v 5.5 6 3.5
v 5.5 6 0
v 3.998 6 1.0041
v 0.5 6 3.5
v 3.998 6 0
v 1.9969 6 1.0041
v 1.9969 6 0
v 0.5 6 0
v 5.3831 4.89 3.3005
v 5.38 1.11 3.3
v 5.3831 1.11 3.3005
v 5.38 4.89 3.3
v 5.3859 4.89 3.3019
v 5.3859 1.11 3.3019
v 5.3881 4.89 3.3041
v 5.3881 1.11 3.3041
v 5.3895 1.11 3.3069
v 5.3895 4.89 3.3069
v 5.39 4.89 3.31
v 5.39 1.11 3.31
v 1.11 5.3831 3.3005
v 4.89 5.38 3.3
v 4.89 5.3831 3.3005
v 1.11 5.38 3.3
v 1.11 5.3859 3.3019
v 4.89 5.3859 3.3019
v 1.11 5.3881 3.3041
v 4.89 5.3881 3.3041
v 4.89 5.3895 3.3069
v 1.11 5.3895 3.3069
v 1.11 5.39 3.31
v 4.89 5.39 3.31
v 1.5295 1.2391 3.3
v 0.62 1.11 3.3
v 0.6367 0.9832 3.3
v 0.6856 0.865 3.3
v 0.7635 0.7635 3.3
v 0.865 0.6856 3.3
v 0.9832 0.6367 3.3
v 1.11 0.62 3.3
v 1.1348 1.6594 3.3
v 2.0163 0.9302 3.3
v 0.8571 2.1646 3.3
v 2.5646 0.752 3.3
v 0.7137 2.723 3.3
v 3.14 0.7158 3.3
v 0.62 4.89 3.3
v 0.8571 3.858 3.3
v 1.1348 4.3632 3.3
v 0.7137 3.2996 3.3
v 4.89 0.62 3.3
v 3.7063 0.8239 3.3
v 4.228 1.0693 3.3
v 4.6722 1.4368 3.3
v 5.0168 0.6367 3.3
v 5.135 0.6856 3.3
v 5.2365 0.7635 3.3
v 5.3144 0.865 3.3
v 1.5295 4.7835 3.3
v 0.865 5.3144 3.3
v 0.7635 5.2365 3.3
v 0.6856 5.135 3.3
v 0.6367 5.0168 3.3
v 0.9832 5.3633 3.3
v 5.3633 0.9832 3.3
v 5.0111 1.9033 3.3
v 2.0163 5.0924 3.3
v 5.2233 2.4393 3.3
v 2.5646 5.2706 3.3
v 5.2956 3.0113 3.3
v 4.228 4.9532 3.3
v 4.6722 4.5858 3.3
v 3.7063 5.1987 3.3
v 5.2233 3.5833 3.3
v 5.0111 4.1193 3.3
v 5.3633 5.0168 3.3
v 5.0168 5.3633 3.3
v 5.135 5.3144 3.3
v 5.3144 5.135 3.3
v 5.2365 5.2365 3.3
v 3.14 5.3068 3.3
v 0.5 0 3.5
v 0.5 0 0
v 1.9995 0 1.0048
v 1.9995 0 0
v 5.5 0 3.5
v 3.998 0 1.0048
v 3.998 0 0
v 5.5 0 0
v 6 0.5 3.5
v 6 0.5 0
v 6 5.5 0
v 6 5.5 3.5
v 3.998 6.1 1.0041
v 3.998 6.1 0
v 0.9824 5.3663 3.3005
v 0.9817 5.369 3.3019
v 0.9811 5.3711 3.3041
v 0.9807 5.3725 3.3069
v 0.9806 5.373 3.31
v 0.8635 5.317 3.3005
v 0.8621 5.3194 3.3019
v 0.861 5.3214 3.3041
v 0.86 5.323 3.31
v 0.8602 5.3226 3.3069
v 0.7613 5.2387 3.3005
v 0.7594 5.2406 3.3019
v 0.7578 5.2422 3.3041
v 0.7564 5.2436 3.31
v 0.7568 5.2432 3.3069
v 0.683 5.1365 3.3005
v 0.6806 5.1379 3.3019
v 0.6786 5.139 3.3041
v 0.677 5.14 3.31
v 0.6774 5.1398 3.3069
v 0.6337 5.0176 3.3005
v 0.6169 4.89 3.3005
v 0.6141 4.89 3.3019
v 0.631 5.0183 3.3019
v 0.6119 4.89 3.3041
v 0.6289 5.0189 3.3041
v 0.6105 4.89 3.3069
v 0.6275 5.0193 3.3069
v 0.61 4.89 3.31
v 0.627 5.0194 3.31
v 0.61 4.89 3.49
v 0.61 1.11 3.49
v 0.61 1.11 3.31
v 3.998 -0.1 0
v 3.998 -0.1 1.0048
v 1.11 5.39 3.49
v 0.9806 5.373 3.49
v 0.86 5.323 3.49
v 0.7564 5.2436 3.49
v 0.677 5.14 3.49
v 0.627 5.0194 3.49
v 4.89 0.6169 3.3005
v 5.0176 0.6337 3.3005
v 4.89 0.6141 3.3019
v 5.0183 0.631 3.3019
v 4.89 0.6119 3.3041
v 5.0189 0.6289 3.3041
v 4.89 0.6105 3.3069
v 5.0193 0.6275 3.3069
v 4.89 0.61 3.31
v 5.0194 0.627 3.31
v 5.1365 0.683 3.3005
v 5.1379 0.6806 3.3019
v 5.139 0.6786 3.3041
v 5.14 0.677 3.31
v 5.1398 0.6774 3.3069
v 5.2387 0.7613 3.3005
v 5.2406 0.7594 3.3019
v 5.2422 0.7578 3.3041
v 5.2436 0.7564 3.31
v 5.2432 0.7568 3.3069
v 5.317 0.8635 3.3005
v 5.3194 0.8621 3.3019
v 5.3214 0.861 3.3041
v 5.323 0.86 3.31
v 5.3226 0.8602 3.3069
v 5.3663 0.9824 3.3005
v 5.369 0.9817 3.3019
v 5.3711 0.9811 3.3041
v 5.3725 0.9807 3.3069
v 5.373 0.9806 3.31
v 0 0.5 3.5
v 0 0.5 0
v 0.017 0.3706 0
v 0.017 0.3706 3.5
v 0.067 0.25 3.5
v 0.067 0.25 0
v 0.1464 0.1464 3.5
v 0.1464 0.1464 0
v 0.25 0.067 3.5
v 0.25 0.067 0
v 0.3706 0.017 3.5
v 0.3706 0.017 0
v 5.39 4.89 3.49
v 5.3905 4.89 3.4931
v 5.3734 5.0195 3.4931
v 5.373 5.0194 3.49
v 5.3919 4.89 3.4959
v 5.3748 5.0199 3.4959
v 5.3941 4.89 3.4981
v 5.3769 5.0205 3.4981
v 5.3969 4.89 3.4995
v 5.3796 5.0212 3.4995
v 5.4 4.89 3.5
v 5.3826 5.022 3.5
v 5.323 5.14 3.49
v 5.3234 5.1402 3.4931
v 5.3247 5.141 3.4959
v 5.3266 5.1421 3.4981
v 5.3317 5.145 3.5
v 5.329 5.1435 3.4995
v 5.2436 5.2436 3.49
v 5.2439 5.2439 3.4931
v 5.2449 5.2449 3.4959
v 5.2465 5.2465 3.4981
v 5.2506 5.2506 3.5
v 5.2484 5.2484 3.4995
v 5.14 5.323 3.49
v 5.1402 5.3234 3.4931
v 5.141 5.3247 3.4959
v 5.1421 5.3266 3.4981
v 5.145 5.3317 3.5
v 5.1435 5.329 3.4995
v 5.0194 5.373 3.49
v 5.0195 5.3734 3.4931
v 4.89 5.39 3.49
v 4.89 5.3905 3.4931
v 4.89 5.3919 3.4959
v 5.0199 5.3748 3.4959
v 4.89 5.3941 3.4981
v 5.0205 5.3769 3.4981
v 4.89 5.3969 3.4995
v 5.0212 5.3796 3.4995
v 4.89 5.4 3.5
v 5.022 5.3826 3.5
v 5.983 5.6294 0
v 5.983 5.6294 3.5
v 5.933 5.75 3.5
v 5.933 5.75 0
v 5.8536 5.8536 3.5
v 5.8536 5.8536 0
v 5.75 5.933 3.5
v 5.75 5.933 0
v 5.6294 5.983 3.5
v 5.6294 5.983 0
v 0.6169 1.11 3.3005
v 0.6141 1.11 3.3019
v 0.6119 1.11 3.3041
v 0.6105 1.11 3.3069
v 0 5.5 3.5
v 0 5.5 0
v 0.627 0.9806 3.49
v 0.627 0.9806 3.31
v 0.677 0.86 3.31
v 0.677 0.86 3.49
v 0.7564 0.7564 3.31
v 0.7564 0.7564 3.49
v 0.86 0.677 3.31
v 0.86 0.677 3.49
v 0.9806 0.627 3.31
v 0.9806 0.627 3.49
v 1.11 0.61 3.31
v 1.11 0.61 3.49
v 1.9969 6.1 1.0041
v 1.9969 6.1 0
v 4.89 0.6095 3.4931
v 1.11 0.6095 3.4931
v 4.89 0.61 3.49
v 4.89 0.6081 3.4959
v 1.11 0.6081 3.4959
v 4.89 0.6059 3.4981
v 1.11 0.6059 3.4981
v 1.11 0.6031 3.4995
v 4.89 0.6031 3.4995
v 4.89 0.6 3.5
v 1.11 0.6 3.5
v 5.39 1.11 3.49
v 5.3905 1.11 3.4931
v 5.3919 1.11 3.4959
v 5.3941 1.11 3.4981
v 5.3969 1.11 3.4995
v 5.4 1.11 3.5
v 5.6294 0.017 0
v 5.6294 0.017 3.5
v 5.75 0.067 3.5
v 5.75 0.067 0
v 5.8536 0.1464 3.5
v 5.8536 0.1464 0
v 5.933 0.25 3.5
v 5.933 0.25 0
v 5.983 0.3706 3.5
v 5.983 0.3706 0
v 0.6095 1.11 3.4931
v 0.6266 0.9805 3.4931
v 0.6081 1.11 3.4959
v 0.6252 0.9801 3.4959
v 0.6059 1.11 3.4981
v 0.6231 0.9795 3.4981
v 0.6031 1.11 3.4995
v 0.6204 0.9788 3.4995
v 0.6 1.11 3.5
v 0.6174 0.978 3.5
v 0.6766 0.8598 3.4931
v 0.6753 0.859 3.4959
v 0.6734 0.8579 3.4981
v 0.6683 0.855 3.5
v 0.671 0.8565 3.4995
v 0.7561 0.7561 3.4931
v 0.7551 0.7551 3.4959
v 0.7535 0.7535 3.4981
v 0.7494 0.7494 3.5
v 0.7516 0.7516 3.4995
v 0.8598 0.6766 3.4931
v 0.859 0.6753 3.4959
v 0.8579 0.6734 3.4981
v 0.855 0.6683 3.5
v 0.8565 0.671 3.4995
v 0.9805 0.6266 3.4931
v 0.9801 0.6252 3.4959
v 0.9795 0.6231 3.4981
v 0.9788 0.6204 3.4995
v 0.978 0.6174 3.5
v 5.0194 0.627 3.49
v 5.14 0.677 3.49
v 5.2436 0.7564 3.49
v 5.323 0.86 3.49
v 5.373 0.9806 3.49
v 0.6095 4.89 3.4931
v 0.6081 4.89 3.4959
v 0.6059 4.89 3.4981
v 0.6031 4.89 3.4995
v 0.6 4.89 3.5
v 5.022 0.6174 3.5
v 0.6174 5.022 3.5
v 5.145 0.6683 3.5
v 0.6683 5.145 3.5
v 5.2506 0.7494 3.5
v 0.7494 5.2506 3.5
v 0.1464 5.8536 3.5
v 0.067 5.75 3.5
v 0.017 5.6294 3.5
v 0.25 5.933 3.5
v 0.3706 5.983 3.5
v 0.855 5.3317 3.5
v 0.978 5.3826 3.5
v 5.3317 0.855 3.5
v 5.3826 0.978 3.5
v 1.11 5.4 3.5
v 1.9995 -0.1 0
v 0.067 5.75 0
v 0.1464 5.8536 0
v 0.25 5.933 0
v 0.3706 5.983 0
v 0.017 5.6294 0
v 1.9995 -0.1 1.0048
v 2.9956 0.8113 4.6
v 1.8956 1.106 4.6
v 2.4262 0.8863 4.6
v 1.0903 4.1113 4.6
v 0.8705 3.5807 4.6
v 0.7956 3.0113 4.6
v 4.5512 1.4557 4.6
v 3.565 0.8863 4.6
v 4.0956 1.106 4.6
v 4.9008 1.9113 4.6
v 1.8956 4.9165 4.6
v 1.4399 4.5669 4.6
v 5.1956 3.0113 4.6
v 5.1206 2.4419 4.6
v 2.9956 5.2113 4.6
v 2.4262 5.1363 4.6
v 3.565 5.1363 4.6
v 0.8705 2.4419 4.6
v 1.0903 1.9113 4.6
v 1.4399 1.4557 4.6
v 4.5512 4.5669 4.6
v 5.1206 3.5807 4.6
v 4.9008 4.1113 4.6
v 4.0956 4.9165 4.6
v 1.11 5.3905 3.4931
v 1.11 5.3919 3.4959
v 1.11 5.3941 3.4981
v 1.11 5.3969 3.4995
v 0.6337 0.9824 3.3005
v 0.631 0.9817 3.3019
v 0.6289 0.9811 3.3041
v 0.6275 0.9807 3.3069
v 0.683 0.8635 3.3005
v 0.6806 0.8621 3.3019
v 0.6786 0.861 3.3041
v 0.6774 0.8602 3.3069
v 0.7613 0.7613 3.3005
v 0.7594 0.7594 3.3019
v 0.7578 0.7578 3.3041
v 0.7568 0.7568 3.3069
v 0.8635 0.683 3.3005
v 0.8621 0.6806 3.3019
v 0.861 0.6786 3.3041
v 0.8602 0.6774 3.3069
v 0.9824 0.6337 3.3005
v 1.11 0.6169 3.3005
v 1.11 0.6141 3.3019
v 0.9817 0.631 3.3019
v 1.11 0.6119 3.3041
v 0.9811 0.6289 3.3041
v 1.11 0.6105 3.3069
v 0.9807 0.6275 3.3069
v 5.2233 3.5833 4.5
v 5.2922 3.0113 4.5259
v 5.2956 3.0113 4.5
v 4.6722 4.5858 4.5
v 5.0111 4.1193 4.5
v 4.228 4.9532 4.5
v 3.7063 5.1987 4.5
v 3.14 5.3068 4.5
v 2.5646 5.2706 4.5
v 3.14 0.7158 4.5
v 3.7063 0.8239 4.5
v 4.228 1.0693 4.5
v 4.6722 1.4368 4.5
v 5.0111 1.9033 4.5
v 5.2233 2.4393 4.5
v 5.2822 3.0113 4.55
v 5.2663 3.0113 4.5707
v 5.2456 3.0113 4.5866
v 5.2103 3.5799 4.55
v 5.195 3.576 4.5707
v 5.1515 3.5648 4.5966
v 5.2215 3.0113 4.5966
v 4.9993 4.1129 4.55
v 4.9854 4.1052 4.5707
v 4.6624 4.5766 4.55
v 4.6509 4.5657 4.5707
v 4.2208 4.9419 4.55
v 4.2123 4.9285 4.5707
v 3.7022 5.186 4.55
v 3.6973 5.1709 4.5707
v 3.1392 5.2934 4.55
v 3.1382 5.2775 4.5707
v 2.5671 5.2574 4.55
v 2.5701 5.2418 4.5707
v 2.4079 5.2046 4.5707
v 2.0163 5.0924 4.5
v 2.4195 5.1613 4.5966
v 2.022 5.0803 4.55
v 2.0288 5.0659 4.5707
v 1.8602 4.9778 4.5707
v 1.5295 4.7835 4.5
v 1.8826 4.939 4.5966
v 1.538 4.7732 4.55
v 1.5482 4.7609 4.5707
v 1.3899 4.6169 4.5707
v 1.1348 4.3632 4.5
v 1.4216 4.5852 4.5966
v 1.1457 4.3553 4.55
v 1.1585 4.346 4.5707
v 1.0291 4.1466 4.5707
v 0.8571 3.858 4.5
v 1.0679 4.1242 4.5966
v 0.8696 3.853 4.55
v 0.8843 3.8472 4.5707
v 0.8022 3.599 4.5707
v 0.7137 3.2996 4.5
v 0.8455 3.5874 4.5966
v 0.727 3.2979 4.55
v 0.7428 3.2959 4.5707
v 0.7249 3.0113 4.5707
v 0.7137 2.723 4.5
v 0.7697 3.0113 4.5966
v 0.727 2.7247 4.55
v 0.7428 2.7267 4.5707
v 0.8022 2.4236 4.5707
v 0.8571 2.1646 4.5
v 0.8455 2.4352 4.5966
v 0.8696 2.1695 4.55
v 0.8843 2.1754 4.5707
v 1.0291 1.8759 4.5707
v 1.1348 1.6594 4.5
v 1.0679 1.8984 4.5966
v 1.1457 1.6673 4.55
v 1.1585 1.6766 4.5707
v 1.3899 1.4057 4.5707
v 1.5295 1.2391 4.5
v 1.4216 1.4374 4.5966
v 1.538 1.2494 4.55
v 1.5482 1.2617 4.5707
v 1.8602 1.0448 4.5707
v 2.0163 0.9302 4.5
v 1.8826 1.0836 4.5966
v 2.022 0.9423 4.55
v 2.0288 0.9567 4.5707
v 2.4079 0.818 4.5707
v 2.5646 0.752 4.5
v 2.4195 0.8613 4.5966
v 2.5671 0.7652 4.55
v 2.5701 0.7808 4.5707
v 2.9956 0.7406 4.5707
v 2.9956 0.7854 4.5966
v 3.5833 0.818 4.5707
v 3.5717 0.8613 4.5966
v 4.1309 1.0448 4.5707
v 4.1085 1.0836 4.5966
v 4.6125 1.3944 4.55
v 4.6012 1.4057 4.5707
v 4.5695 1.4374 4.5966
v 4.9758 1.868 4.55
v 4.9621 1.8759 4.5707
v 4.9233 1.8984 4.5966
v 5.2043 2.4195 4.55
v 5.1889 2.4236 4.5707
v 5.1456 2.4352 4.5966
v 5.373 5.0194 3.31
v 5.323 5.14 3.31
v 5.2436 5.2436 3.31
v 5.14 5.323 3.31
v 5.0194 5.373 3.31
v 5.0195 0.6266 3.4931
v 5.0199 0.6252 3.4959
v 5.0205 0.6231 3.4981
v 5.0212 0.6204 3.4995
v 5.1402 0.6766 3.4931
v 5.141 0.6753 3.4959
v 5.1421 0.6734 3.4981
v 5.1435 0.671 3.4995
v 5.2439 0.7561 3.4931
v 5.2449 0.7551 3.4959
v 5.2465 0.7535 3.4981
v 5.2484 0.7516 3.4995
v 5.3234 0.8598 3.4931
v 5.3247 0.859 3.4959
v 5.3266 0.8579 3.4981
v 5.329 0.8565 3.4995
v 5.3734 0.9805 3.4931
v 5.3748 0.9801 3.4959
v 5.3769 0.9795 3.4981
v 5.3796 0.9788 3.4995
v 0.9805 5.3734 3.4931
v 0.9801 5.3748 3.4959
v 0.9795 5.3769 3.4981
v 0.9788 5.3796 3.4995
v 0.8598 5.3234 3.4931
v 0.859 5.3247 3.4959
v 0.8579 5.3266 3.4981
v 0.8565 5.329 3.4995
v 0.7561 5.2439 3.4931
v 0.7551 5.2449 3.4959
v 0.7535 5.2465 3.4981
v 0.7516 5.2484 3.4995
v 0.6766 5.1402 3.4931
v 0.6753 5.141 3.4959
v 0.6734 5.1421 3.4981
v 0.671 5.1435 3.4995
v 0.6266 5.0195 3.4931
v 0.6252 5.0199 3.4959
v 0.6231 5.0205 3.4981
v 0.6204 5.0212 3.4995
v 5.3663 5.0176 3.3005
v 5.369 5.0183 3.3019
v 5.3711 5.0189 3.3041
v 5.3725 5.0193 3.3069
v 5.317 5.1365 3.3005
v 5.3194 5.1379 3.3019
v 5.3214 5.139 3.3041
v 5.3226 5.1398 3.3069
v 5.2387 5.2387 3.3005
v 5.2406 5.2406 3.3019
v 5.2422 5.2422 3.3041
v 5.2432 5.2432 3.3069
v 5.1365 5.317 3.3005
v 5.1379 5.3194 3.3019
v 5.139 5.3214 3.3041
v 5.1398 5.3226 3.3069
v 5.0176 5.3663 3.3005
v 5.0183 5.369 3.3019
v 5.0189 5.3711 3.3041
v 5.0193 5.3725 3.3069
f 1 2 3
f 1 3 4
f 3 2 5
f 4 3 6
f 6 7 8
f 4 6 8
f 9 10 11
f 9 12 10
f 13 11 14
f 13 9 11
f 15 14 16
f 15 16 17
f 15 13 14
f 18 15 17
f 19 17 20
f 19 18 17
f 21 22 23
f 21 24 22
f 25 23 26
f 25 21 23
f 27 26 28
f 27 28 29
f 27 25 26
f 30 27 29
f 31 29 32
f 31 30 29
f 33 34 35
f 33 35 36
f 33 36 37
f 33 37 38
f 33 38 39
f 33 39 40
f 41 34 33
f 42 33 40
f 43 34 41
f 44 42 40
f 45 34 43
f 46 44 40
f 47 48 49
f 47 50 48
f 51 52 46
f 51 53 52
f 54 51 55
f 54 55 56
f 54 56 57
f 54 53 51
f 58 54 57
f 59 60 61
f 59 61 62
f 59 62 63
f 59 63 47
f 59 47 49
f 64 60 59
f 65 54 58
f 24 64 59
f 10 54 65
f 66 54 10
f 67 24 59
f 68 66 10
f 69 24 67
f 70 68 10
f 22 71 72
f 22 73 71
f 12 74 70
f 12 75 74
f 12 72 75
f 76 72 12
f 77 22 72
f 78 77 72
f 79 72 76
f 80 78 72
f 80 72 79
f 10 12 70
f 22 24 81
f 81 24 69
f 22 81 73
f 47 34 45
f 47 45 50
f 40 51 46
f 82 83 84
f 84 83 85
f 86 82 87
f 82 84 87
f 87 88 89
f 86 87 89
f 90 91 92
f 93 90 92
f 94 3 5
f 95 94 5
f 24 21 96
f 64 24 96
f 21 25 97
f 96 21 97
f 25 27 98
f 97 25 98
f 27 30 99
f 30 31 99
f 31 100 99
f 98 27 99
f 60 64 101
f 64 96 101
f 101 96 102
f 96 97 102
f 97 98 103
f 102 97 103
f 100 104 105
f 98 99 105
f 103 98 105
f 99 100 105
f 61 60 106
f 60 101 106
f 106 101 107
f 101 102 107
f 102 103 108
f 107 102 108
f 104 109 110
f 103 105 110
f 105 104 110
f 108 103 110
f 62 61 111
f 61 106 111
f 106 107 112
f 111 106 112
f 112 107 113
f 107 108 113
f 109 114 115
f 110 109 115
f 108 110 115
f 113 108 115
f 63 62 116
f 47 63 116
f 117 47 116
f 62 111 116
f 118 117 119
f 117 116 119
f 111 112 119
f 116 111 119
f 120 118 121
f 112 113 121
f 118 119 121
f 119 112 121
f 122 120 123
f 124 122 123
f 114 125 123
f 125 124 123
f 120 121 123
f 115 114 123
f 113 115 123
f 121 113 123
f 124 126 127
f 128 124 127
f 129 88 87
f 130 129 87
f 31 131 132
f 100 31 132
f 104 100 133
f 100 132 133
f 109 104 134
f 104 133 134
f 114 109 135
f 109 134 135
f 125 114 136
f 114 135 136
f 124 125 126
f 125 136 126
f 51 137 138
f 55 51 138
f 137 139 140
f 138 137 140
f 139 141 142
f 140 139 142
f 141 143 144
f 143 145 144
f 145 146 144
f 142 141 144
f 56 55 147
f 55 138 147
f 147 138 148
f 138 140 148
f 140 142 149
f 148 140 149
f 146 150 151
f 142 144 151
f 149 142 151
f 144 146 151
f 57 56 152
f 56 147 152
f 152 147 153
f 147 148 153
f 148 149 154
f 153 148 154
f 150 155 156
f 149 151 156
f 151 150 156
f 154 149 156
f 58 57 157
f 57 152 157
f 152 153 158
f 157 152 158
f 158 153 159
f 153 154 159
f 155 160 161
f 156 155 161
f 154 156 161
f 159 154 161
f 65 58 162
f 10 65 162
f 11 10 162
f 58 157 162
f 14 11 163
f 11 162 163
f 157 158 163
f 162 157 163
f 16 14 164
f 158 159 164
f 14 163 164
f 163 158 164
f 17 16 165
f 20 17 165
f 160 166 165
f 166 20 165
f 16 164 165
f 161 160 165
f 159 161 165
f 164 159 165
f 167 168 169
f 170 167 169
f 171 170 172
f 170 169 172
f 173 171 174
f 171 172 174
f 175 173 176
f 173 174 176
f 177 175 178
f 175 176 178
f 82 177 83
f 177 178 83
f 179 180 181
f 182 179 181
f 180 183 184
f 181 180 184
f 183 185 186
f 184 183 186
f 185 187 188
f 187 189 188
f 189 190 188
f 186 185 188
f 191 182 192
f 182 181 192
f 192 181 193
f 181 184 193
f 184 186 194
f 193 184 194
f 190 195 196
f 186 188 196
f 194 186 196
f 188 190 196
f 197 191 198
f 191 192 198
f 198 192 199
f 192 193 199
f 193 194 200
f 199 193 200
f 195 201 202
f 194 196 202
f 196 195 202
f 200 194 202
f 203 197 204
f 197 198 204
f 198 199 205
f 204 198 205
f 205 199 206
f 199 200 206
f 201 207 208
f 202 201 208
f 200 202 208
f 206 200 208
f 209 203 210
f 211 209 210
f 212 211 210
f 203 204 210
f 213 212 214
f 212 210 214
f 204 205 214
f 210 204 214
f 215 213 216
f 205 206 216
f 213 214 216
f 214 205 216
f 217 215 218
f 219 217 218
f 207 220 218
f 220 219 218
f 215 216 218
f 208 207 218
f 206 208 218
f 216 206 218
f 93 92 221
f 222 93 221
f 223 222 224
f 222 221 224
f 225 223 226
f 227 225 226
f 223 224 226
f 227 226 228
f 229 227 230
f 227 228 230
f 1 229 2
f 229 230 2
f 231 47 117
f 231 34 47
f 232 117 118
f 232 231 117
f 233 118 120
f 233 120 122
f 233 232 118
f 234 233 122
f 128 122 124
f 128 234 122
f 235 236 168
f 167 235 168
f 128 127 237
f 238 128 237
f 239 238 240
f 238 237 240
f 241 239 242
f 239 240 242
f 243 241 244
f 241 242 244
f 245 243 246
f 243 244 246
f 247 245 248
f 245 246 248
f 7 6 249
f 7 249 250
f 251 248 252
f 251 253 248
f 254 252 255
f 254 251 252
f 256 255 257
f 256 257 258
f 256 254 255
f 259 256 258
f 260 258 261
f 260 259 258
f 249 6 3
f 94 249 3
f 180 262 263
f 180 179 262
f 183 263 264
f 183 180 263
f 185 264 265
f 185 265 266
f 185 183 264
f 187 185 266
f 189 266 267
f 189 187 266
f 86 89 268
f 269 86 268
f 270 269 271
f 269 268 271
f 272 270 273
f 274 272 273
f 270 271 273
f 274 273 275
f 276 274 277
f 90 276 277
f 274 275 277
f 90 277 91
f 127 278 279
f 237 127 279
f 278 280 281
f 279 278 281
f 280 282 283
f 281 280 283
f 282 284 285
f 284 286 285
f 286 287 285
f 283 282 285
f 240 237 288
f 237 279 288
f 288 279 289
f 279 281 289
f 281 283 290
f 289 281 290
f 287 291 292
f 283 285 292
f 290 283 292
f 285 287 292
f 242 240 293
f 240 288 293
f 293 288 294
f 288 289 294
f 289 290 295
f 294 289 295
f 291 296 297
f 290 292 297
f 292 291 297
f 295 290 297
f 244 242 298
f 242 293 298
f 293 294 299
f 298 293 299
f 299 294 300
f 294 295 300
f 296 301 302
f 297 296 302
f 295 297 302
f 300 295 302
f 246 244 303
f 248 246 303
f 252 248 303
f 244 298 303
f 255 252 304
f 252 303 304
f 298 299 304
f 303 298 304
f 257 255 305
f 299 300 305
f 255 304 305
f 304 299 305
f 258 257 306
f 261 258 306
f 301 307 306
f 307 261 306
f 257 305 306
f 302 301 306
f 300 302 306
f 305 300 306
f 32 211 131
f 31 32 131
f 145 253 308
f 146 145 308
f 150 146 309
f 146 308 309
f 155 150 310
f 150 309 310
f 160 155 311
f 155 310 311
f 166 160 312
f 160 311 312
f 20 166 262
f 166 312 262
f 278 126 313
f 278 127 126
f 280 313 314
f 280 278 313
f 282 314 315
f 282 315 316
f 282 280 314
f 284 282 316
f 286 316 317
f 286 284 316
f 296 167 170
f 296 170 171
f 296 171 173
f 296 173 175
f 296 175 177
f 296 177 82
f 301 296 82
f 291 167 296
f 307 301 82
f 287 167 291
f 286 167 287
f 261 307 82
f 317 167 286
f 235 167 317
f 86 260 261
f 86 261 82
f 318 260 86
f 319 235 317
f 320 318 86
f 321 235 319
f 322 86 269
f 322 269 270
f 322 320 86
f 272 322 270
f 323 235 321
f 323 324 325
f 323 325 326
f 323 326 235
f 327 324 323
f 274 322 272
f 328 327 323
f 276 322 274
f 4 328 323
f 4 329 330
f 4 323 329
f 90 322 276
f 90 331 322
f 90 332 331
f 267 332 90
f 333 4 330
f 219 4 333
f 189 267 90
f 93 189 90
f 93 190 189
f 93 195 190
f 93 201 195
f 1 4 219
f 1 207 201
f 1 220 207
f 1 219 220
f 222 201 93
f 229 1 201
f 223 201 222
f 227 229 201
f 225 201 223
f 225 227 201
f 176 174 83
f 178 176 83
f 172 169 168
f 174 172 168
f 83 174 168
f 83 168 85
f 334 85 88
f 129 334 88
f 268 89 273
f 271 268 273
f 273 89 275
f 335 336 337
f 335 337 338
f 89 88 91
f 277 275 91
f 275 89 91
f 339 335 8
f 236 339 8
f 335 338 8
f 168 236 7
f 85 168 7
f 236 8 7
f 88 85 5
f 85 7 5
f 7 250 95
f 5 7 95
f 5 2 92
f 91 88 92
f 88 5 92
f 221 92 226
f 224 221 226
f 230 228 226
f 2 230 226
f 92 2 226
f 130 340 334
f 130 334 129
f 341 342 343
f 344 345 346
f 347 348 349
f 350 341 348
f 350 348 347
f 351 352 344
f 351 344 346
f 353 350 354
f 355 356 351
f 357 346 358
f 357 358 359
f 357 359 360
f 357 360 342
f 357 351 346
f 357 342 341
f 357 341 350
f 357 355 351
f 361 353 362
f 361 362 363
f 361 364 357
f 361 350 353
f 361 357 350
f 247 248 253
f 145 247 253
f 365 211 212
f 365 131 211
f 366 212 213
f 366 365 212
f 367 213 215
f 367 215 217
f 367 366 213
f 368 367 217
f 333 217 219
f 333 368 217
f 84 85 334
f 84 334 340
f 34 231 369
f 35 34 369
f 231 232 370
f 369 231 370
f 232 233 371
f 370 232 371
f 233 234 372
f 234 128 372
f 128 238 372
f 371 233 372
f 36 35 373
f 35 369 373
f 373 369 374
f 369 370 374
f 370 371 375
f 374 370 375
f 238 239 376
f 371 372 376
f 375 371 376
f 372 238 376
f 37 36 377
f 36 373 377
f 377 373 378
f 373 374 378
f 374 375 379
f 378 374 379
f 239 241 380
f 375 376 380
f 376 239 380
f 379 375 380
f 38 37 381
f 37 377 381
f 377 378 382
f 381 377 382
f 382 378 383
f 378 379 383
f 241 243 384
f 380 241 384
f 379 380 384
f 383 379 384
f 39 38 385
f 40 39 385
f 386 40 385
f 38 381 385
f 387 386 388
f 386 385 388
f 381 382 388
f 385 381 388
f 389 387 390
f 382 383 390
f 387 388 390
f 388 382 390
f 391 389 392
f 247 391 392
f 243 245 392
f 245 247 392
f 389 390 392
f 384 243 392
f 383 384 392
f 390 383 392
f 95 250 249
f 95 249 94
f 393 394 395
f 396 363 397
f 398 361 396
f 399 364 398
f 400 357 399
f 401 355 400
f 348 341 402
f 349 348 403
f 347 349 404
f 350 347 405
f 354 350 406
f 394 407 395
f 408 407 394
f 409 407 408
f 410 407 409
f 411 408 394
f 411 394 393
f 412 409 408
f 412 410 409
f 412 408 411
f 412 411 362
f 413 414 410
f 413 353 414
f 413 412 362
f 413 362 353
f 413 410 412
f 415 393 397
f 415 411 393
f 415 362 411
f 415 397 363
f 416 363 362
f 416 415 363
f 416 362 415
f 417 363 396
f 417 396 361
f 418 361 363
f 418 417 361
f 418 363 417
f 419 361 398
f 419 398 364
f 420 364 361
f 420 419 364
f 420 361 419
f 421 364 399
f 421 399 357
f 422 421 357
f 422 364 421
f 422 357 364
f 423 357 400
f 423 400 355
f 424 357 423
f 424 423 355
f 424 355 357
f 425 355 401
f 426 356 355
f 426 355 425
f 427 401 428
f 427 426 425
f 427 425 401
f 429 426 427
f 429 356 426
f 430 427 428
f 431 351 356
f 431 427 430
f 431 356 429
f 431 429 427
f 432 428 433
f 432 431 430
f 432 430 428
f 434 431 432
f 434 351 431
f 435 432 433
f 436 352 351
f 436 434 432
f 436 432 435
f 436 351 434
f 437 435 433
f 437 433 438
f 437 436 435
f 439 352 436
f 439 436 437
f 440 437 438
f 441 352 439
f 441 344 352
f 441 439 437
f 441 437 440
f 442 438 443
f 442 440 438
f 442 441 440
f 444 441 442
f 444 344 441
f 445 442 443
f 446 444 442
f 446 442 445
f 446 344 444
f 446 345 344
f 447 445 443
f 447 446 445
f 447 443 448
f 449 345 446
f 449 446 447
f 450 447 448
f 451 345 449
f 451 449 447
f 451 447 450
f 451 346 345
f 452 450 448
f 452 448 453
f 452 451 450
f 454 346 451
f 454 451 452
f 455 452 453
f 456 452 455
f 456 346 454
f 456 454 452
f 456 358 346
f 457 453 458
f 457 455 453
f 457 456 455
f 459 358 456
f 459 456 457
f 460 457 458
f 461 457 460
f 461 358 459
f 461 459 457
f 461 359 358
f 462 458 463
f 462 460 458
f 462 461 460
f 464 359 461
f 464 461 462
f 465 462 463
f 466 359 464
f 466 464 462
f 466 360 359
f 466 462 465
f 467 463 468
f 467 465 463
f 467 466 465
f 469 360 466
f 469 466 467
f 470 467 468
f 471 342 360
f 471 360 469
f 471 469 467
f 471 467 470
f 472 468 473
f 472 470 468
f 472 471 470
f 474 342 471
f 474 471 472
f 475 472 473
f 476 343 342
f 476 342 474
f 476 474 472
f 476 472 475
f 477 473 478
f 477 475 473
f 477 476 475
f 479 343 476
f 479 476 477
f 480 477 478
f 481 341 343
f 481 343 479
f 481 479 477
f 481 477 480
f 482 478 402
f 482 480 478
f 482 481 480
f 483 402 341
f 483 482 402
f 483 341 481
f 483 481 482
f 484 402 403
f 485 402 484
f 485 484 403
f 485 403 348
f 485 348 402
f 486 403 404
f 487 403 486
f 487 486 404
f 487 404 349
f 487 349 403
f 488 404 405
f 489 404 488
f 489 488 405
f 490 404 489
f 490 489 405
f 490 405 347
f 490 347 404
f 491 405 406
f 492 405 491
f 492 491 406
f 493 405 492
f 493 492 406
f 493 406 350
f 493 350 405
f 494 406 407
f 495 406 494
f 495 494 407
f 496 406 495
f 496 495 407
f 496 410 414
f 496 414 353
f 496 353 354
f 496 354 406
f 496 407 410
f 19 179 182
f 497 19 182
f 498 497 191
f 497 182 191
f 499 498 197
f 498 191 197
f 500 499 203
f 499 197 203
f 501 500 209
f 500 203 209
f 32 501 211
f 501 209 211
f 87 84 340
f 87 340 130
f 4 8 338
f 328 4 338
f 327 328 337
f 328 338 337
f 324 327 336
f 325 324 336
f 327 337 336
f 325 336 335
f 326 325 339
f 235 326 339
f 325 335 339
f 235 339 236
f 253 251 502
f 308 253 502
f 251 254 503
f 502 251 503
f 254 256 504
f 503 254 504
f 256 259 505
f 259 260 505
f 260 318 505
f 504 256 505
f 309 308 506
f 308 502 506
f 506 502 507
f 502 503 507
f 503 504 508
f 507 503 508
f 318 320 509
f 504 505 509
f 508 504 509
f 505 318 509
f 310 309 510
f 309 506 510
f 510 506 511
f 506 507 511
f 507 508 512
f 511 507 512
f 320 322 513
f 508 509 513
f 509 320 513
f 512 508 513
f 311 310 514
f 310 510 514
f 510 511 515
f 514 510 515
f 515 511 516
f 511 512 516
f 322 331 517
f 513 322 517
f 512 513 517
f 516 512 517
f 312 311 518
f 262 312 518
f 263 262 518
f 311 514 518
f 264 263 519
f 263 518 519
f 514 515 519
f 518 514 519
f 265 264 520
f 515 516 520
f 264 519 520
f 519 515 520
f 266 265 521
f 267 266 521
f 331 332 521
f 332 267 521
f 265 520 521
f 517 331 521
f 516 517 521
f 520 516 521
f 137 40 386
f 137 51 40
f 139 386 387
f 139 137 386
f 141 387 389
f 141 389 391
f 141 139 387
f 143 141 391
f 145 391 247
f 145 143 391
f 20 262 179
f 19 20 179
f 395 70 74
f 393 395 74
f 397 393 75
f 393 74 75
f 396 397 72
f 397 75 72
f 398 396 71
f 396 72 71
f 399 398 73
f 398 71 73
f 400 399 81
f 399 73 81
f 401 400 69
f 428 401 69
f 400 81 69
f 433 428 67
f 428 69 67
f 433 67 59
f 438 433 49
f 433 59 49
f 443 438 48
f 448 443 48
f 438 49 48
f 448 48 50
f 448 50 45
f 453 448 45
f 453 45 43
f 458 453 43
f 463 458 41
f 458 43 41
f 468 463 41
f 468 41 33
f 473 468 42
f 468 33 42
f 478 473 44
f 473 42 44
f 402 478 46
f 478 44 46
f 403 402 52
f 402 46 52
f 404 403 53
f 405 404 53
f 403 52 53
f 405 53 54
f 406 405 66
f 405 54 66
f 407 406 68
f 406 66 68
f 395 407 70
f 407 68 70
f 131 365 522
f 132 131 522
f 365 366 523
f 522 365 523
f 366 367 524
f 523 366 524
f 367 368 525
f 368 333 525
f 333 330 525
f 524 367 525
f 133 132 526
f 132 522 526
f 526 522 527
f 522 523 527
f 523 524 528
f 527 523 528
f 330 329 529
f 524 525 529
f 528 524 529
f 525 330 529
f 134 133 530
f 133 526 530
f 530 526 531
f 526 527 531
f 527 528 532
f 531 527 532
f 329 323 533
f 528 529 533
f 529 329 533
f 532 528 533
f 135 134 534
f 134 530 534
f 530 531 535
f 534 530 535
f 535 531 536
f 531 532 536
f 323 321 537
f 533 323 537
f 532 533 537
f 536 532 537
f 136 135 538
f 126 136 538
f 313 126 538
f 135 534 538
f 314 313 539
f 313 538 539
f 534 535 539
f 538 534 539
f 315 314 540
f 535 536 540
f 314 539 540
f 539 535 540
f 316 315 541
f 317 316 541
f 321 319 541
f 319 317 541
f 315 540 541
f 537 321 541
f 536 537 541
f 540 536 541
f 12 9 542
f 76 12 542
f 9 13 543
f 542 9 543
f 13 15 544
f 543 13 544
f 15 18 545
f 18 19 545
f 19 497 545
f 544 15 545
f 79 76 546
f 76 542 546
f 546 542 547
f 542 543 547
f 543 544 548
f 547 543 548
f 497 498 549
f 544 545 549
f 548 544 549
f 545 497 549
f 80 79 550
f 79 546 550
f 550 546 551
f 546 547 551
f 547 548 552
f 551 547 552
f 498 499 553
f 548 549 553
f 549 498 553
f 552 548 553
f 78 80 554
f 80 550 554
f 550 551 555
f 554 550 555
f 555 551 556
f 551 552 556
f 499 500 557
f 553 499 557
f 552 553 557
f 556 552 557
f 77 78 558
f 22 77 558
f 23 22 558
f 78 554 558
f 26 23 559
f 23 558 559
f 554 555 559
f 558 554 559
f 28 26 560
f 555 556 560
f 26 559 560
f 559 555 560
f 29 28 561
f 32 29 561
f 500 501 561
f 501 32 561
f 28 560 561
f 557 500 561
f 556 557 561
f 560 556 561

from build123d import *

# Parameters (mm, degrees)
BOSS_EXTRU_1_DEPTH      = 3.5
ENL_V_MAT_EXTRU_1_DEPTH = 0.2
ESQUISSE3_R             = 2.3
BOSS_EXTRU_2_DEPTH      = 1.3
CONG_1_R                = 0.1
CONG_2_R                = 0.01
ESQUISSE4_W             = 1.998545811
ESQUISSE4_H             = 1.004796591
BOSS_EXTRU_3_DEPTH      = 0.1
ESQUISSE5_W             = 2.001116517
ESQUISSE5_H             = 1.004085413
BOSS_EXTRU_4_DEPTH      = 0.1


with BuildPart() as part:
    # Esquisse1 → Boss.-Extru.1 (new body)
    with BuildSketch(Plane.XY):
        with BuildLine():
            Line((0.5, 0), (5.5, 0))
            ThreePointArc((5.5, 0), (5.853553391, 0.146446609), (6, 0.5))
            Line((6, 0.5), (6, 5.5))
            ThreePointArc((6, 5.5), (5.853553391, 5.853553391), (5.5, 6))
            Line((5.5, 6), (0.5, 6))
            ThreePointArc((0.5, 6), (0.146446609, 5.853553391), (0, 5.5))
            Line((0, 5.5), (0, 0.5))
            ThreePointArc((0, 0.5), (0.146446609, 0.146446609), (0.5, 0))
        make_face()
    extrude(amount=BOSS_EXTRU_1_DEPTH)

    # Esquisse2 → Enlèv. mat.-Extru.1 (cut)
    with BuildSketch(Plane.XY.offset(3.5)):
        with BuildLine():
            Line((1.11, 0.61), (4.89, 0.61))
            ThreePointArc((4.89, 0.61), (5.243553391, 0.756446609), (5.39, 1.11))
            Line((5.39, 1.11), (5.39, 4.89))
            ThreePointArc((5.39, 4.89), (5.243553391, 5.243553391), (4.89, 5.39))
            Line((4.89, 5.39), (1.11, 5.39))
            ThreePointArc((1.11, 5.39), (0.756446609, 5.243553391), (0.61, 4.89))
            Line((0.61, 4.89), (0.61, 1.11))
            ThreePointArc((0.61, 1.11), (0.756446609, 0.756446609), (1.11, 0.61))
        make_face()
    extrude(amount=-ENL_V_MAT_EXTRU_1_DEPTH, mode=Mode.SUBTRACT)

    # Esquisse3 → Boss.-Extru.2 (add)
    with BuildSketch(Plane.XY.offset(3.3)):
        with Locations((2.9955811, 3.011293081)):
            Circle(ESQUISSE3_R)
    extrude(amount=BOSS_EXTRU_2_DEPTH)

    # Congé1
    cong_1_edges = [part.edges().sort_by_distance(p)[0] for p in [
        (0.6955811, 3.011293081, 4.6),
    ]]
    fillet(cong_1_edges, radius=CONG_1_R)

    # Congé2
    cong_2_edges = [part.edges().sort_by_distance(p)[0] for p in [
        (5.243553391, 0.756446609, 3.3),
        (3, 0.61, 3.3),
        (0.756446609, 0.756446609, 3.3),
        (0.61, 3, 3.3),
        (0.756446609, 5.243553391, 3.3),
        (3, 5.39, 3.3),
        (5.243553391, 5.243553391, 3.3),
        (5.39, 3, 3.3),
        (5.243553391, 0.756446609, 3.5),
        (5.39, 3, 3.5),
        (5.243553391, 5.243553391, 3.5),
        (3, 5.39, 3.5),
        (0.756446609, 5.243553391, 3.5),
        (0.61, 3, 3.5),
        (0.756446609, 0.756446609, 3.5),
        (3, 0.61, 3.5),
    ]]
    fillet(cong_2_edges, radius=CONG_2_R)

    # Esquisse4 → Boss.-Extru.3 (add)
    with BuildSketch(Plane.XZ):
        with Locations((2.998734602, 0.502398296)):
            Rectangle(ESQUISSE4_W, ESQUISSE4_H)
    extrude(amount=BOSS_EXTRU_3_DEPTH)

    # Esquisse5 → Boss.-Extru.4 (add)
    with BuildSketch(Plane(origin=(0, 6, 0), x_dir=(1, 0, 0), z_dir=(0, 1, 0))):
        with Locations((2.997449249, -0.502042707)):
            Rectangle(ESQUISSE5_W, ESQUISSE5_H)
    extrude(amount=BOSS_EXTRU_4_DEPTH)


solid = part.part
